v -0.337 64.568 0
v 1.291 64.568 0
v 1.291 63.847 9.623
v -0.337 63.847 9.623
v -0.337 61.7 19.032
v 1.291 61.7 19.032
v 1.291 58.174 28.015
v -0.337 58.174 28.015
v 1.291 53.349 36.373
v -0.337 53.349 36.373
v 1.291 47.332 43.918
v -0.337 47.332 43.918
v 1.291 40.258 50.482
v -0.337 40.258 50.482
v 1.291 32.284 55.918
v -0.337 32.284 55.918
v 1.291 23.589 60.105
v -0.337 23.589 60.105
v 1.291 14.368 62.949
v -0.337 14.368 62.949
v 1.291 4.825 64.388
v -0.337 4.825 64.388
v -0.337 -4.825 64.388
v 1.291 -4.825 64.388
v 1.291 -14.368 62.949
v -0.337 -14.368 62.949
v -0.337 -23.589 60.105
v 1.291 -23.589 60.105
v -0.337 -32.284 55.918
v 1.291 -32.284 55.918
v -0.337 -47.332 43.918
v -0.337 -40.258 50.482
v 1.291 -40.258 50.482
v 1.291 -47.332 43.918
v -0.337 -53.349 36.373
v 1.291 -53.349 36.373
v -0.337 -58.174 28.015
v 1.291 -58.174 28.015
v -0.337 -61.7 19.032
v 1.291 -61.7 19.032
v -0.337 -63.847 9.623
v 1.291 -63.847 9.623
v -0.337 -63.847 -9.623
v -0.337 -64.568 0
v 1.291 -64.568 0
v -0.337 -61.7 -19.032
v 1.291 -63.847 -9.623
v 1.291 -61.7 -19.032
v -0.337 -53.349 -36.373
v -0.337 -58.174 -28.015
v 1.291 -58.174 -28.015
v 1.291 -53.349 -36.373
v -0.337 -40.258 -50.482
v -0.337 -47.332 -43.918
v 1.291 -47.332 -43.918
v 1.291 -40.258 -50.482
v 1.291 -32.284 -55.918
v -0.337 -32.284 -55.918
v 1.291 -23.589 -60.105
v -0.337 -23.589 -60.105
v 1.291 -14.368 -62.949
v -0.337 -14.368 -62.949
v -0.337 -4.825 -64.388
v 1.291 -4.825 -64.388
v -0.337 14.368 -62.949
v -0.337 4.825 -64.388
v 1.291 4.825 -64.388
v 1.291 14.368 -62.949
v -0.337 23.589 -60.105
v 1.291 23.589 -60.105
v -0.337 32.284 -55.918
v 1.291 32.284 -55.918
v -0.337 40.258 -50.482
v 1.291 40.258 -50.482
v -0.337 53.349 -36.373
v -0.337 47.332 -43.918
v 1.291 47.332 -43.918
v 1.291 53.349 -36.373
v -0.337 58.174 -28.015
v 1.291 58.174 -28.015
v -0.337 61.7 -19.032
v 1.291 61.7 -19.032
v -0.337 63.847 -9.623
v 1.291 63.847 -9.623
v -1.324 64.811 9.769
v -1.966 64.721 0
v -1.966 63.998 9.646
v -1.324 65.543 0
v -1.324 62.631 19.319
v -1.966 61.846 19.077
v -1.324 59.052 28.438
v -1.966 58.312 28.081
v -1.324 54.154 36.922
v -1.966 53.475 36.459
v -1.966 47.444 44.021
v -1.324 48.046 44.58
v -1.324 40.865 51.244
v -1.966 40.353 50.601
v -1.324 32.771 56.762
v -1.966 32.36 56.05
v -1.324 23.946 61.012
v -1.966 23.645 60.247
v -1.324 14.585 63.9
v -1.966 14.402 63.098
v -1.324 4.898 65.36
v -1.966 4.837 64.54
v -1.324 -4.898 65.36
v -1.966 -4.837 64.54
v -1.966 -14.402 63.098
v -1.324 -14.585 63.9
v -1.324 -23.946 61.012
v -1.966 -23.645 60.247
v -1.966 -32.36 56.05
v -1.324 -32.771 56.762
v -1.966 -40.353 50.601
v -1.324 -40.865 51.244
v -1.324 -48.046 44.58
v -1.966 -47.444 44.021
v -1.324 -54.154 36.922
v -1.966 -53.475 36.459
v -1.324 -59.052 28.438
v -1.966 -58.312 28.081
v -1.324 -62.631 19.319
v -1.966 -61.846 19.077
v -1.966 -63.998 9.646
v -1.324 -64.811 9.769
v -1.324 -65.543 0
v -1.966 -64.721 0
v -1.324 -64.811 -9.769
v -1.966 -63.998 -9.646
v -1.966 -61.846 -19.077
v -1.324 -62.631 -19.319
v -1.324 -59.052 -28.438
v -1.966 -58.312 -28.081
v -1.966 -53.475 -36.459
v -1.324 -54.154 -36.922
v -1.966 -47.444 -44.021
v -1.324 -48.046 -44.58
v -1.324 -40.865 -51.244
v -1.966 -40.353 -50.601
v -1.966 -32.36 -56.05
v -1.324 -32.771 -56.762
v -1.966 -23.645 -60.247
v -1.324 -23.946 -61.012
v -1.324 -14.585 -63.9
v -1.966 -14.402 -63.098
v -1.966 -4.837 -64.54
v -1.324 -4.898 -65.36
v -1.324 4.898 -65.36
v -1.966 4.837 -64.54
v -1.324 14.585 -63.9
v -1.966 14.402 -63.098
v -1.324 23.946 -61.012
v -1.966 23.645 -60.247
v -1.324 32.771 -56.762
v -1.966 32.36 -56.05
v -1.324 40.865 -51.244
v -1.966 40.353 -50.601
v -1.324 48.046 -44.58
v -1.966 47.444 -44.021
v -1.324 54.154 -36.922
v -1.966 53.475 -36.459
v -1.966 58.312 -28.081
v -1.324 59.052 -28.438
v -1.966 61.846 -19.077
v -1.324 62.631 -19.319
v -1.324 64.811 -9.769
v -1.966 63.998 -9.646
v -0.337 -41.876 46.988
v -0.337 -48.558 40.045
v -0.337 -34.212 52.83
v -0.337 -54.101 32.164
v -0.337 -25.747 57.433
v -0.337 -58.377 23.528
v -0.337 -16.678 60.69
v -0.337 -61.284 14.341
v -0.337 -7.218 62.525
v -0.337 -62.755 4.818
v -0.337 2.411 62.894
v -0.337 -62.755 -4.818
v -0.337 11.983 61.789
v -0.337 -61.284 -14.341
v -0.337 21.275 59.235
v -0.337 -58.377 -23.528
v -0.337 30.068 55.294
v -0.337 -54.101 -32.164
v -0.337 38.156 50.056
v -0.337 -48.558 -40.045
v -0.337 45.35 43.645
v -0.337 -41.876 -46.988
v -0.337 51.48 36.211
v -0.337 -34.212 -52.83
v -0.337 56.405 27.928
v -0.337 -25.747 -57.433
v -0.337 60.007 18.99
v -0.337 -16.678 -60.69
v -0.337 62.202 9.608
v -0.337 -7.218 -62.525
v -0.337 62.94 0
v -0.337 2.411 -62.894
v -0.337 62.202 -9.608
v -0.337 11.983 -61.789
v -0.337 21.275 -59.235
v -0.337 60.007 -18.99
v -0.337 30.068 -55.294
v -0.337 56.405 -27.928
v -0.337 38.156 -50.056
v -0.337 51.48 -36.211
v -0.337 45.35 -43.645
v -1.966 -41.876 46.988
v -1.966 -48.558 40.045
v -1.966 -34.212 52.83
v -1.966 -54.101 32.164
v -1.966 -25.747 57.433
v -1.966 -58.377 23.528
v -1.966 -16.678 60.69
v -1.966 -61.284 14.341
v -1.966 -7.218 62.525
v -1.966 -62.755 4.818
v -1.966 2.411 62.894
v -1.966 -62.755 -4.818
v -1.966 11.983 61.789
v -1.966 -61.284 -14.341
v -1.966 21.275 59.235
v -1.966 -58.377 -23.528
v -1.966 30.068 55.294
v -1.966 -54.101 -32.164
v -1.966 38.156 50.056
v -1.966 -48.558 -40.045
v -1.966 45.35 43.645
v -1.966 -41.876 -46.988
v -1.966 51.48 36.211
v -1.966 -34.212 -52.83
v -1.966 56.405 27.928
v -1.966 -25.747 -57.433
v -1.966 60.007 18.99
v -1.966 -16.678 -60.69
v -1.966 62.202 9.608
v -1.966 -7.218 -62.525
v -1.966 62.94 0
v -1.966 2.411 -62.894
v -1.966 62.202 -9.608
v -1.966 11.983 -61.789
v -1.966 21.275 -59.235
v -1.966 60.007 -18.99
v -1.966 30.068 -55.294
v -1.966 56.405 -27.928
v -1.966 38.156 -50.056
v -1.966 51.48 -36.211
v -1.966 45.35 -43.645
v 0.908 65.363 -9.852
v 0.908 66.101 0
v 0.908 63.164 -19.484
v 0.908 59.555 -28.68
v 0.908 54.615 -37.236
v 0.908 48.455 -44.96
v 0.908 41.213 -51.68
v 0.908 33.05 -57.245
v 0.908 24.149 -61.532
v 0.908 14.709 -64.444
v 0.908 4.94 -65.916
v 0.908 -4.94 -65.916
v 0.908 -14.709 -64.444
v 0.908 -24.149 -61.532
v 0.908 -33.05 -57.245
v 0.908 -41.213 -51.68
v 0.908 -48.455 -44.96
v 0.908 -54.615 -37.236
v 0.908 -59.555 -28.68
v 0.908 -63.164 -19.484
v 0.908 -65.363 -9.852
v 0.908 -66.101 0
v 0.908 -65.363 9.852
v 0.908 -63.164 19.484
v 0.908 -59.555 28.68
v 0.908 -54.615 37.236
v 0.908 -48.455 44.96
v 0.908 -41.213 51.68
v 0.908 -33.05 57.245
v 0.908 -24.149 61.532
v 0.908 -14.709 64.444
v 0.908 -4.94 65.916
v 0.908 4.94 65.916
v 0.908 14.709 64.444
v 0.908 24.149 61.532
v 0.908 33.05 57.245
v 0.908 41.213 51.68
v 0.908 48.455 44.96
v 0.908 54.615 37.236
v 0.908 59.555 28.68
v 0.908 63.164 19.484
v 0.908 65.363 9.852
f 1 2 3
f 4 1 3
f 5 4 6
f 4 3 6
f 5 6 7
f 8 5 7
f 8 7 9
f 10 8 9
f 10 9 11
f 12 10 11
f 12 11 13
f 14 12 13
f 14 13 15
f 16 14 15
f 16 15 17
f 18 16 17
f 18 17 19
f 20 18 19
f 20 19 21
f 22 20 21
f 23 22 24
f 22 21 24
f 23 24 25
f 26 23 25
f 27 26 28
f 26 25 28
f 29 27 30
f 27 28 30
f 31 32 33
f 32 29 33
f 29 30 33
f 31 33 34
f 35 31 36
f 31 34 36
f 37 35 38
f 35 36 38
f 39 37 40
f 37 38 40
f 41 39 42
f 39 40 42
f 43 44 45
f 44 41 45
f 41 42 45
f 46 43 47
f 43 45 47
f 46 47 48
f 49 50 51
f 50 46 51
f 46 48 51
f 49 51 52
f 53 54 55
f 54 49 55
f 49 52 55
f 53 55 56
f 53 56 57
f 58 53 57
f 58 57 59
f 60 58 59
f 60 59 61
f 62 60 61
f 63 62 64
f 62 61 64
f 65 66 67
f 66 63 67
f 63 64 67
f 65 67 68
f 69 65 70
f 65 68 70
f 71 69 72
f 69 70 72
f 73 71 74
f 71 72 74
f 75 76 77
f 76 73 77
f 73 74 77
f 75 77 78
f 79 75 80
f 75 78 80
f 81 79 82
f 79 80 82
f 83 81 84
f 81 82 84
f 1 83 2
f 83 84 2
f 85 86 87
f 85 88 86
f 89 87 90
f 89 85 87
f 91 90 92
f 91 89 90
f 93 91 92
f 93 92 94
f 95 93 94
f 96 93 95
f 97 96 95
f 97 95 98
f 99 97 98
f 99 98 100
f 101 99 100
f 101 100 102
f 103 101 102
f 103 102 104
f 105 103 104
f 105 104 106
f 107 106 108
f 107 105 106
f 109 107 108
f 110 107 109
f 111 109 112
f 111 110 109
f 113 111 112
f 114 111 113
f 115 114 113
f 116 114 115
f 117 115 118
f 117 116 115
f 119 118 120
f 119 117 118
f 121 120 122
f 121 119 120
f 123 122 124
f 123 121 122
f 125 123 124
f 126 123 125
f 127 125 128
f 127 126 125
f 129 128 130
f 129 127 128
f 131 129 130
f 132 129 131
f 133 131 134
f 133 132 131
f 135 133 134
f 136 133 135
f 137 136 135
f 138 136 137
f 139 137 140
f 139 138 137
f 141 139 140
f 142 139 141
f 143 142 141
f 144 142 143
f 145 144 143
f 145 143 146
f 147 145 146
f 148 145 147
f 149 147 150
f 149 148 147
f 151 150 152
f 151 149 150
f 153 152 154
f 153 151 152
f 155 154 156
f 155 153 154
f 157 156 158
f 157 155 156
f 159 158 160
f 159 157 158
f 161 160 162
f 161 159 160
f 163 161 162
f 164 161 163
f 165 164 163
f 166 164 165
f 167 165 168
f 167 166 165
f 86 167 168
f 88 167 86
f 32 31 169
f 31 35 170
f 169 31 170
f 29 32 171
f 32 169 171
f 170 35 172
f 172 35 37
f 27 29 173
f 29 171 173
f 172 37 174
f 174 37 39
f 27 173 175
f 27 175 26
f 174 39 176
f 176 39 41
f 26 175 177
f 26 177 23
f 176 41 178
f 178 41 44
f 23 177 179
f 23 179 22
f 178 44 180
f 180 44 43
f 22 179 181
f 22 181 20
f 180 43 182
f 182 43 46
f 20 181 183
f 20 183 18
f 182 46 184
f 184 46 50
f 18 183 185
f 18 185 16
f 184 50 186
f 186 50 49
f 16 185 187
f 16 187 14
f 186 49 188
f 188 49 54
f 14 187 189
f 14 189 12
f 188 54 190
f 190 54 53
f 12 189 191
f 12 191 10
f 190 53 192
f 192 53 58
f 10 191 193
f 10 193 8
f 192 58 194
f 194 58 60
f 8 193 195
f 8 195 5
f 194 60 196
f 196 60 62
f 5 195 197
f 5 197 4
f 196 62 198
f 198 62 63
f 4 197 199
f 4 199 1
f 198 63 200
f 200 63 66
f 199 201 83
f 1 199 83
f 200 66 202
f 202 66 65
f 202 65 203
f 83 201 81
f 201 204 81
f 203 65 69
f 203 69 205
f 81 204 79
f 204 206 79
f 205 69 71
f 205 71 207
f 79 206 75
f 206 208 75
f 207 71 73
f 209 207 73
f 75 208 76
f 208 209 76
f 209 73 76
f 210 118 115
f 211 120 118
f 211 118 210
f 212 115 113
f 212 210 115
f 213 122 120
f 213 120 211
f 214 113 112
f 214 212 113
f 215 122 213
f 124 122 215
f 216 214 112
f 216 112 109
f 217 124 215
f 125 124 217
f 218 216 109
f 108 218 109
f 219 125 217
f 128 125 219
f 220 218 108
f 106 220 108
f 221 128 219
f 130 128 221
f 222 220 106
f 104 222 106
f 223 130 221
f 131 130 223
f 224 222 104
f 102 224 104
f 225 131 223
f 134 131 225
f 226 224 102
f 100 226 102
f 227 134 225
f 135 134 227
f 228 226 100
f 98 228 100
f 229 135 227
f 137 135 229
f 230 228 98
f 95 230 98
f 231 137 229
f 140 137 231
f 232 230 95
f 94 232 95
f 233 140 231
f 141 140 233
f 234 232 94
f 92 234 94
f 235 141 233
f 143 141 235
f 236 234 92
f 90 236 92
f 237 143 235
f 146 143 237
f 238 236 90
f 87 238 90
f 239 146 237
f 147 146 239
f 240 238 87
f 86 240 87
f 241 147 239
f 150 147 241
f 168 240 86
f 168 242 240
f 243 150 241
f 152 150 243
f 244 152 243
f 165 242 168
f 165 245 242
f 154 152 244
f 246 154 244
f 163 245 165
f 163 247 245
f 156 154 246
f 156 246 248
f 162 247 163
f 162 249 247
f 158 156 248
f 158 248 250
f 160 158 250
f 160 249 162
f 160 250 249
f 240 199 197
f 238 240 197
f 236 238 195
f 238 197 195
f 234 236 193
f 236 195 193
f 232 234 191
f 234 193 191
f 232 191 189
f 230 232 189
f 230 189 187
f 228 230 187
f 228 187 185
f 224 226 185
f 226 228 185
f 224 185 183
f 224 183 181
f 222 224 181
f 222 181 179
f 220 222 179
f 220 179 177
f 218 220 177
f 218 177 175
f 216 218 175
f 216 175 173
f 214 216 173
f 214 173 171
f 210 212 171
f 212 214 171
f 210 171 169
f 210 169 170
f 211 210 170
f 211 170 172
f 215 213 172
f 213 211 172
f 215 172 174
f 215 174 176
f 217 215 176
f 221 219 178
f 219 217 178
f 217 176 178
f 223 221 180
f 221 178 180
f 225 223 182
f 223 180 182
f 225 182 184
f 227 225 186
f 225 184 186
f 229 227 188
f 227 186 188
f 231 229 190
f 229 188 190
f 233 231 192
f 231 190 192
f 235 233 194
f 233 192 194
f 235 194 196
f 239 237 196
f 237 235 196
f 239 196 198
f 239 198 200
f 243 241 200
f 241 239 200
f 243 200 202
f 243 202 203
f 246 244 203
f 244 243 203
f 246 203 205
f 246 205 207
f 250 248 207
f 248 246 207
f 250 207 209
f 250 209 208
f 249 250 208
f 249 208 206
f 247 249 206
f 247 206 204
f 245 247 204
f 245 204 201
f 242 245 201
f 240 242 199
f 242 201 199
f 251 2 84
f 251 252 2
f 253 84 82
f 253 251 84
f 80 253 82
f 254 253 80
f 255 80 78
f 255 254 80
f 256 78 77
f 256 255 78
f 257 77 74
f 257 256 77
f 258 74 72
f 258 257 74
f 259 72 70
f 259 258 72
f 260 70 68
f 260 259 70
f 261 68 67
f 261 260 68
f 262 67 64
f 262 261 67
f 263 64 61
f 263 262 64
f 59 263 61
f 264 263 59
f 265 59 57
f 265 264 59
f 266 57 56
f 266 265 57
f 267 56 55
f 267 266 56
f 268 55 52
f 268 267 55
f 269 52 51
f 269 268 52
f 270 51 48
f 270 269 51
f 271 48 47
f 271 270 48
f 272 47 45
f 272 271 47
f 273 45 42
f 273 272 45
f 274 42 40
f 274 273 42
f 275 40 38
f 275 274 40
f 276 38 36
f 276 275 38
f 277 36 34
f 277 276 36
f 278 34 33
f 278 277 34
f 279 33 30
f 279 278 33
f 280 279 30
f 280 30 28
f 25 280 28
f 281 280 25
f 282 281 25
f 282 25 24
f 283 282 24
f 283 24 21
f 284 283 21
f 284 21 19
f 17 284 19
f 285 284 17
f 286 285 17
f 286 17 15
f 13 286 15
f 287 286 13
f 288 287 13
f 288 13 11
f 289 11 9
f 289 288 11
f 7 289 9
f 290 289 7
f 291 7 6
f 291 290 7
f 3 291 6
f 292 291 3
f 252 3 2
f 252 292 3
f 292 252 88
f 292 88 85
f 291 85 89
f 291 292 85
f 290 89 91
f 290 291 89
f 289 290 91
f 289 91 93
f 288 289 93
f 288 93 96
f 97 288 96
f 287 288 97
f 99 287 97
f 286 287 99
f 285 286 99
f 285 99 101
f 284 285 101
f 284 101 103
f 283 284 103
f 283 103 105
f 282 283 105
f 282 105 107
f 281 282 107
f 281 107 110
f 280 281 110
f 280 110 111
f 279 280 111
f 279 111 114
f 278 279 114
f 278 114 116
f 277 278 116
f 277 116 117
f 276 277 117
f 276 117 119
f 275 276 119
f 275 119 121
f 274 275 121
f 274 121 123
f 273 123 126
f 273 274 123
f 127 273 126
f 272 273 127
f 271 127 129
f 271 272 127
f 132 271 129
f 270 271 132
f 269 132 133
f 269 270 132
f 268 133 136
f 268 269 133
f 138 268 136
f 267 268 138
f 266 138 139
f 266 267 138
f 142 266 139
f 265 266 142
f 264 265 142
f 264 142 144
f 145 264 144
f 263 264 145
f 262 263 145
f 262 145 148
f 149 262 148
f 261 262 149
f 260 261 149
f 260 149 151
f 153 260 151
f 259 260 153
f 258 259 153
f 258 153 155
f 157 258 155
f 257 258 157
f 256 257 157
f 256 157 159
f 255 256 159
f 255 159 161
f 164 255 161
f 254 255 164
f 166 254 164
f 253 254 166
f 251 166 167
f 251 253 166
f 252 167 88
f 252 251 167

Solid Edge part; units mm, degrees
sketch "Sketch1" plane through (0, 0, 0) normal (0, 0, 1) x (1, 0, 0)
  line L0 (-1.9657, 64.721) -> (-1.9657, 62.94)
  line L1 (-1.9657, 62.94) -> (-0.3373, 62.94)
  line L2 (-0.3373, 62.94) -> (-0.3373, 64.5683)
  line L3 (-0.3373, 64.5683) -> (1.291, 64.5683)
  line L4 (1.291, 64.5683) -> (0.9079, 66.1009)
  line L5 (0.9079, 66.1009) -> (-1.3239, 65.5429)
  line L6 (-1.3239, 65.5429) -> (-1.9657, 64.721)
revolve "RevolvedProtrusion1" add sketch "Sketch1" angle 360 about axis through (50, 0, 0) along (-1, 0, 0)
